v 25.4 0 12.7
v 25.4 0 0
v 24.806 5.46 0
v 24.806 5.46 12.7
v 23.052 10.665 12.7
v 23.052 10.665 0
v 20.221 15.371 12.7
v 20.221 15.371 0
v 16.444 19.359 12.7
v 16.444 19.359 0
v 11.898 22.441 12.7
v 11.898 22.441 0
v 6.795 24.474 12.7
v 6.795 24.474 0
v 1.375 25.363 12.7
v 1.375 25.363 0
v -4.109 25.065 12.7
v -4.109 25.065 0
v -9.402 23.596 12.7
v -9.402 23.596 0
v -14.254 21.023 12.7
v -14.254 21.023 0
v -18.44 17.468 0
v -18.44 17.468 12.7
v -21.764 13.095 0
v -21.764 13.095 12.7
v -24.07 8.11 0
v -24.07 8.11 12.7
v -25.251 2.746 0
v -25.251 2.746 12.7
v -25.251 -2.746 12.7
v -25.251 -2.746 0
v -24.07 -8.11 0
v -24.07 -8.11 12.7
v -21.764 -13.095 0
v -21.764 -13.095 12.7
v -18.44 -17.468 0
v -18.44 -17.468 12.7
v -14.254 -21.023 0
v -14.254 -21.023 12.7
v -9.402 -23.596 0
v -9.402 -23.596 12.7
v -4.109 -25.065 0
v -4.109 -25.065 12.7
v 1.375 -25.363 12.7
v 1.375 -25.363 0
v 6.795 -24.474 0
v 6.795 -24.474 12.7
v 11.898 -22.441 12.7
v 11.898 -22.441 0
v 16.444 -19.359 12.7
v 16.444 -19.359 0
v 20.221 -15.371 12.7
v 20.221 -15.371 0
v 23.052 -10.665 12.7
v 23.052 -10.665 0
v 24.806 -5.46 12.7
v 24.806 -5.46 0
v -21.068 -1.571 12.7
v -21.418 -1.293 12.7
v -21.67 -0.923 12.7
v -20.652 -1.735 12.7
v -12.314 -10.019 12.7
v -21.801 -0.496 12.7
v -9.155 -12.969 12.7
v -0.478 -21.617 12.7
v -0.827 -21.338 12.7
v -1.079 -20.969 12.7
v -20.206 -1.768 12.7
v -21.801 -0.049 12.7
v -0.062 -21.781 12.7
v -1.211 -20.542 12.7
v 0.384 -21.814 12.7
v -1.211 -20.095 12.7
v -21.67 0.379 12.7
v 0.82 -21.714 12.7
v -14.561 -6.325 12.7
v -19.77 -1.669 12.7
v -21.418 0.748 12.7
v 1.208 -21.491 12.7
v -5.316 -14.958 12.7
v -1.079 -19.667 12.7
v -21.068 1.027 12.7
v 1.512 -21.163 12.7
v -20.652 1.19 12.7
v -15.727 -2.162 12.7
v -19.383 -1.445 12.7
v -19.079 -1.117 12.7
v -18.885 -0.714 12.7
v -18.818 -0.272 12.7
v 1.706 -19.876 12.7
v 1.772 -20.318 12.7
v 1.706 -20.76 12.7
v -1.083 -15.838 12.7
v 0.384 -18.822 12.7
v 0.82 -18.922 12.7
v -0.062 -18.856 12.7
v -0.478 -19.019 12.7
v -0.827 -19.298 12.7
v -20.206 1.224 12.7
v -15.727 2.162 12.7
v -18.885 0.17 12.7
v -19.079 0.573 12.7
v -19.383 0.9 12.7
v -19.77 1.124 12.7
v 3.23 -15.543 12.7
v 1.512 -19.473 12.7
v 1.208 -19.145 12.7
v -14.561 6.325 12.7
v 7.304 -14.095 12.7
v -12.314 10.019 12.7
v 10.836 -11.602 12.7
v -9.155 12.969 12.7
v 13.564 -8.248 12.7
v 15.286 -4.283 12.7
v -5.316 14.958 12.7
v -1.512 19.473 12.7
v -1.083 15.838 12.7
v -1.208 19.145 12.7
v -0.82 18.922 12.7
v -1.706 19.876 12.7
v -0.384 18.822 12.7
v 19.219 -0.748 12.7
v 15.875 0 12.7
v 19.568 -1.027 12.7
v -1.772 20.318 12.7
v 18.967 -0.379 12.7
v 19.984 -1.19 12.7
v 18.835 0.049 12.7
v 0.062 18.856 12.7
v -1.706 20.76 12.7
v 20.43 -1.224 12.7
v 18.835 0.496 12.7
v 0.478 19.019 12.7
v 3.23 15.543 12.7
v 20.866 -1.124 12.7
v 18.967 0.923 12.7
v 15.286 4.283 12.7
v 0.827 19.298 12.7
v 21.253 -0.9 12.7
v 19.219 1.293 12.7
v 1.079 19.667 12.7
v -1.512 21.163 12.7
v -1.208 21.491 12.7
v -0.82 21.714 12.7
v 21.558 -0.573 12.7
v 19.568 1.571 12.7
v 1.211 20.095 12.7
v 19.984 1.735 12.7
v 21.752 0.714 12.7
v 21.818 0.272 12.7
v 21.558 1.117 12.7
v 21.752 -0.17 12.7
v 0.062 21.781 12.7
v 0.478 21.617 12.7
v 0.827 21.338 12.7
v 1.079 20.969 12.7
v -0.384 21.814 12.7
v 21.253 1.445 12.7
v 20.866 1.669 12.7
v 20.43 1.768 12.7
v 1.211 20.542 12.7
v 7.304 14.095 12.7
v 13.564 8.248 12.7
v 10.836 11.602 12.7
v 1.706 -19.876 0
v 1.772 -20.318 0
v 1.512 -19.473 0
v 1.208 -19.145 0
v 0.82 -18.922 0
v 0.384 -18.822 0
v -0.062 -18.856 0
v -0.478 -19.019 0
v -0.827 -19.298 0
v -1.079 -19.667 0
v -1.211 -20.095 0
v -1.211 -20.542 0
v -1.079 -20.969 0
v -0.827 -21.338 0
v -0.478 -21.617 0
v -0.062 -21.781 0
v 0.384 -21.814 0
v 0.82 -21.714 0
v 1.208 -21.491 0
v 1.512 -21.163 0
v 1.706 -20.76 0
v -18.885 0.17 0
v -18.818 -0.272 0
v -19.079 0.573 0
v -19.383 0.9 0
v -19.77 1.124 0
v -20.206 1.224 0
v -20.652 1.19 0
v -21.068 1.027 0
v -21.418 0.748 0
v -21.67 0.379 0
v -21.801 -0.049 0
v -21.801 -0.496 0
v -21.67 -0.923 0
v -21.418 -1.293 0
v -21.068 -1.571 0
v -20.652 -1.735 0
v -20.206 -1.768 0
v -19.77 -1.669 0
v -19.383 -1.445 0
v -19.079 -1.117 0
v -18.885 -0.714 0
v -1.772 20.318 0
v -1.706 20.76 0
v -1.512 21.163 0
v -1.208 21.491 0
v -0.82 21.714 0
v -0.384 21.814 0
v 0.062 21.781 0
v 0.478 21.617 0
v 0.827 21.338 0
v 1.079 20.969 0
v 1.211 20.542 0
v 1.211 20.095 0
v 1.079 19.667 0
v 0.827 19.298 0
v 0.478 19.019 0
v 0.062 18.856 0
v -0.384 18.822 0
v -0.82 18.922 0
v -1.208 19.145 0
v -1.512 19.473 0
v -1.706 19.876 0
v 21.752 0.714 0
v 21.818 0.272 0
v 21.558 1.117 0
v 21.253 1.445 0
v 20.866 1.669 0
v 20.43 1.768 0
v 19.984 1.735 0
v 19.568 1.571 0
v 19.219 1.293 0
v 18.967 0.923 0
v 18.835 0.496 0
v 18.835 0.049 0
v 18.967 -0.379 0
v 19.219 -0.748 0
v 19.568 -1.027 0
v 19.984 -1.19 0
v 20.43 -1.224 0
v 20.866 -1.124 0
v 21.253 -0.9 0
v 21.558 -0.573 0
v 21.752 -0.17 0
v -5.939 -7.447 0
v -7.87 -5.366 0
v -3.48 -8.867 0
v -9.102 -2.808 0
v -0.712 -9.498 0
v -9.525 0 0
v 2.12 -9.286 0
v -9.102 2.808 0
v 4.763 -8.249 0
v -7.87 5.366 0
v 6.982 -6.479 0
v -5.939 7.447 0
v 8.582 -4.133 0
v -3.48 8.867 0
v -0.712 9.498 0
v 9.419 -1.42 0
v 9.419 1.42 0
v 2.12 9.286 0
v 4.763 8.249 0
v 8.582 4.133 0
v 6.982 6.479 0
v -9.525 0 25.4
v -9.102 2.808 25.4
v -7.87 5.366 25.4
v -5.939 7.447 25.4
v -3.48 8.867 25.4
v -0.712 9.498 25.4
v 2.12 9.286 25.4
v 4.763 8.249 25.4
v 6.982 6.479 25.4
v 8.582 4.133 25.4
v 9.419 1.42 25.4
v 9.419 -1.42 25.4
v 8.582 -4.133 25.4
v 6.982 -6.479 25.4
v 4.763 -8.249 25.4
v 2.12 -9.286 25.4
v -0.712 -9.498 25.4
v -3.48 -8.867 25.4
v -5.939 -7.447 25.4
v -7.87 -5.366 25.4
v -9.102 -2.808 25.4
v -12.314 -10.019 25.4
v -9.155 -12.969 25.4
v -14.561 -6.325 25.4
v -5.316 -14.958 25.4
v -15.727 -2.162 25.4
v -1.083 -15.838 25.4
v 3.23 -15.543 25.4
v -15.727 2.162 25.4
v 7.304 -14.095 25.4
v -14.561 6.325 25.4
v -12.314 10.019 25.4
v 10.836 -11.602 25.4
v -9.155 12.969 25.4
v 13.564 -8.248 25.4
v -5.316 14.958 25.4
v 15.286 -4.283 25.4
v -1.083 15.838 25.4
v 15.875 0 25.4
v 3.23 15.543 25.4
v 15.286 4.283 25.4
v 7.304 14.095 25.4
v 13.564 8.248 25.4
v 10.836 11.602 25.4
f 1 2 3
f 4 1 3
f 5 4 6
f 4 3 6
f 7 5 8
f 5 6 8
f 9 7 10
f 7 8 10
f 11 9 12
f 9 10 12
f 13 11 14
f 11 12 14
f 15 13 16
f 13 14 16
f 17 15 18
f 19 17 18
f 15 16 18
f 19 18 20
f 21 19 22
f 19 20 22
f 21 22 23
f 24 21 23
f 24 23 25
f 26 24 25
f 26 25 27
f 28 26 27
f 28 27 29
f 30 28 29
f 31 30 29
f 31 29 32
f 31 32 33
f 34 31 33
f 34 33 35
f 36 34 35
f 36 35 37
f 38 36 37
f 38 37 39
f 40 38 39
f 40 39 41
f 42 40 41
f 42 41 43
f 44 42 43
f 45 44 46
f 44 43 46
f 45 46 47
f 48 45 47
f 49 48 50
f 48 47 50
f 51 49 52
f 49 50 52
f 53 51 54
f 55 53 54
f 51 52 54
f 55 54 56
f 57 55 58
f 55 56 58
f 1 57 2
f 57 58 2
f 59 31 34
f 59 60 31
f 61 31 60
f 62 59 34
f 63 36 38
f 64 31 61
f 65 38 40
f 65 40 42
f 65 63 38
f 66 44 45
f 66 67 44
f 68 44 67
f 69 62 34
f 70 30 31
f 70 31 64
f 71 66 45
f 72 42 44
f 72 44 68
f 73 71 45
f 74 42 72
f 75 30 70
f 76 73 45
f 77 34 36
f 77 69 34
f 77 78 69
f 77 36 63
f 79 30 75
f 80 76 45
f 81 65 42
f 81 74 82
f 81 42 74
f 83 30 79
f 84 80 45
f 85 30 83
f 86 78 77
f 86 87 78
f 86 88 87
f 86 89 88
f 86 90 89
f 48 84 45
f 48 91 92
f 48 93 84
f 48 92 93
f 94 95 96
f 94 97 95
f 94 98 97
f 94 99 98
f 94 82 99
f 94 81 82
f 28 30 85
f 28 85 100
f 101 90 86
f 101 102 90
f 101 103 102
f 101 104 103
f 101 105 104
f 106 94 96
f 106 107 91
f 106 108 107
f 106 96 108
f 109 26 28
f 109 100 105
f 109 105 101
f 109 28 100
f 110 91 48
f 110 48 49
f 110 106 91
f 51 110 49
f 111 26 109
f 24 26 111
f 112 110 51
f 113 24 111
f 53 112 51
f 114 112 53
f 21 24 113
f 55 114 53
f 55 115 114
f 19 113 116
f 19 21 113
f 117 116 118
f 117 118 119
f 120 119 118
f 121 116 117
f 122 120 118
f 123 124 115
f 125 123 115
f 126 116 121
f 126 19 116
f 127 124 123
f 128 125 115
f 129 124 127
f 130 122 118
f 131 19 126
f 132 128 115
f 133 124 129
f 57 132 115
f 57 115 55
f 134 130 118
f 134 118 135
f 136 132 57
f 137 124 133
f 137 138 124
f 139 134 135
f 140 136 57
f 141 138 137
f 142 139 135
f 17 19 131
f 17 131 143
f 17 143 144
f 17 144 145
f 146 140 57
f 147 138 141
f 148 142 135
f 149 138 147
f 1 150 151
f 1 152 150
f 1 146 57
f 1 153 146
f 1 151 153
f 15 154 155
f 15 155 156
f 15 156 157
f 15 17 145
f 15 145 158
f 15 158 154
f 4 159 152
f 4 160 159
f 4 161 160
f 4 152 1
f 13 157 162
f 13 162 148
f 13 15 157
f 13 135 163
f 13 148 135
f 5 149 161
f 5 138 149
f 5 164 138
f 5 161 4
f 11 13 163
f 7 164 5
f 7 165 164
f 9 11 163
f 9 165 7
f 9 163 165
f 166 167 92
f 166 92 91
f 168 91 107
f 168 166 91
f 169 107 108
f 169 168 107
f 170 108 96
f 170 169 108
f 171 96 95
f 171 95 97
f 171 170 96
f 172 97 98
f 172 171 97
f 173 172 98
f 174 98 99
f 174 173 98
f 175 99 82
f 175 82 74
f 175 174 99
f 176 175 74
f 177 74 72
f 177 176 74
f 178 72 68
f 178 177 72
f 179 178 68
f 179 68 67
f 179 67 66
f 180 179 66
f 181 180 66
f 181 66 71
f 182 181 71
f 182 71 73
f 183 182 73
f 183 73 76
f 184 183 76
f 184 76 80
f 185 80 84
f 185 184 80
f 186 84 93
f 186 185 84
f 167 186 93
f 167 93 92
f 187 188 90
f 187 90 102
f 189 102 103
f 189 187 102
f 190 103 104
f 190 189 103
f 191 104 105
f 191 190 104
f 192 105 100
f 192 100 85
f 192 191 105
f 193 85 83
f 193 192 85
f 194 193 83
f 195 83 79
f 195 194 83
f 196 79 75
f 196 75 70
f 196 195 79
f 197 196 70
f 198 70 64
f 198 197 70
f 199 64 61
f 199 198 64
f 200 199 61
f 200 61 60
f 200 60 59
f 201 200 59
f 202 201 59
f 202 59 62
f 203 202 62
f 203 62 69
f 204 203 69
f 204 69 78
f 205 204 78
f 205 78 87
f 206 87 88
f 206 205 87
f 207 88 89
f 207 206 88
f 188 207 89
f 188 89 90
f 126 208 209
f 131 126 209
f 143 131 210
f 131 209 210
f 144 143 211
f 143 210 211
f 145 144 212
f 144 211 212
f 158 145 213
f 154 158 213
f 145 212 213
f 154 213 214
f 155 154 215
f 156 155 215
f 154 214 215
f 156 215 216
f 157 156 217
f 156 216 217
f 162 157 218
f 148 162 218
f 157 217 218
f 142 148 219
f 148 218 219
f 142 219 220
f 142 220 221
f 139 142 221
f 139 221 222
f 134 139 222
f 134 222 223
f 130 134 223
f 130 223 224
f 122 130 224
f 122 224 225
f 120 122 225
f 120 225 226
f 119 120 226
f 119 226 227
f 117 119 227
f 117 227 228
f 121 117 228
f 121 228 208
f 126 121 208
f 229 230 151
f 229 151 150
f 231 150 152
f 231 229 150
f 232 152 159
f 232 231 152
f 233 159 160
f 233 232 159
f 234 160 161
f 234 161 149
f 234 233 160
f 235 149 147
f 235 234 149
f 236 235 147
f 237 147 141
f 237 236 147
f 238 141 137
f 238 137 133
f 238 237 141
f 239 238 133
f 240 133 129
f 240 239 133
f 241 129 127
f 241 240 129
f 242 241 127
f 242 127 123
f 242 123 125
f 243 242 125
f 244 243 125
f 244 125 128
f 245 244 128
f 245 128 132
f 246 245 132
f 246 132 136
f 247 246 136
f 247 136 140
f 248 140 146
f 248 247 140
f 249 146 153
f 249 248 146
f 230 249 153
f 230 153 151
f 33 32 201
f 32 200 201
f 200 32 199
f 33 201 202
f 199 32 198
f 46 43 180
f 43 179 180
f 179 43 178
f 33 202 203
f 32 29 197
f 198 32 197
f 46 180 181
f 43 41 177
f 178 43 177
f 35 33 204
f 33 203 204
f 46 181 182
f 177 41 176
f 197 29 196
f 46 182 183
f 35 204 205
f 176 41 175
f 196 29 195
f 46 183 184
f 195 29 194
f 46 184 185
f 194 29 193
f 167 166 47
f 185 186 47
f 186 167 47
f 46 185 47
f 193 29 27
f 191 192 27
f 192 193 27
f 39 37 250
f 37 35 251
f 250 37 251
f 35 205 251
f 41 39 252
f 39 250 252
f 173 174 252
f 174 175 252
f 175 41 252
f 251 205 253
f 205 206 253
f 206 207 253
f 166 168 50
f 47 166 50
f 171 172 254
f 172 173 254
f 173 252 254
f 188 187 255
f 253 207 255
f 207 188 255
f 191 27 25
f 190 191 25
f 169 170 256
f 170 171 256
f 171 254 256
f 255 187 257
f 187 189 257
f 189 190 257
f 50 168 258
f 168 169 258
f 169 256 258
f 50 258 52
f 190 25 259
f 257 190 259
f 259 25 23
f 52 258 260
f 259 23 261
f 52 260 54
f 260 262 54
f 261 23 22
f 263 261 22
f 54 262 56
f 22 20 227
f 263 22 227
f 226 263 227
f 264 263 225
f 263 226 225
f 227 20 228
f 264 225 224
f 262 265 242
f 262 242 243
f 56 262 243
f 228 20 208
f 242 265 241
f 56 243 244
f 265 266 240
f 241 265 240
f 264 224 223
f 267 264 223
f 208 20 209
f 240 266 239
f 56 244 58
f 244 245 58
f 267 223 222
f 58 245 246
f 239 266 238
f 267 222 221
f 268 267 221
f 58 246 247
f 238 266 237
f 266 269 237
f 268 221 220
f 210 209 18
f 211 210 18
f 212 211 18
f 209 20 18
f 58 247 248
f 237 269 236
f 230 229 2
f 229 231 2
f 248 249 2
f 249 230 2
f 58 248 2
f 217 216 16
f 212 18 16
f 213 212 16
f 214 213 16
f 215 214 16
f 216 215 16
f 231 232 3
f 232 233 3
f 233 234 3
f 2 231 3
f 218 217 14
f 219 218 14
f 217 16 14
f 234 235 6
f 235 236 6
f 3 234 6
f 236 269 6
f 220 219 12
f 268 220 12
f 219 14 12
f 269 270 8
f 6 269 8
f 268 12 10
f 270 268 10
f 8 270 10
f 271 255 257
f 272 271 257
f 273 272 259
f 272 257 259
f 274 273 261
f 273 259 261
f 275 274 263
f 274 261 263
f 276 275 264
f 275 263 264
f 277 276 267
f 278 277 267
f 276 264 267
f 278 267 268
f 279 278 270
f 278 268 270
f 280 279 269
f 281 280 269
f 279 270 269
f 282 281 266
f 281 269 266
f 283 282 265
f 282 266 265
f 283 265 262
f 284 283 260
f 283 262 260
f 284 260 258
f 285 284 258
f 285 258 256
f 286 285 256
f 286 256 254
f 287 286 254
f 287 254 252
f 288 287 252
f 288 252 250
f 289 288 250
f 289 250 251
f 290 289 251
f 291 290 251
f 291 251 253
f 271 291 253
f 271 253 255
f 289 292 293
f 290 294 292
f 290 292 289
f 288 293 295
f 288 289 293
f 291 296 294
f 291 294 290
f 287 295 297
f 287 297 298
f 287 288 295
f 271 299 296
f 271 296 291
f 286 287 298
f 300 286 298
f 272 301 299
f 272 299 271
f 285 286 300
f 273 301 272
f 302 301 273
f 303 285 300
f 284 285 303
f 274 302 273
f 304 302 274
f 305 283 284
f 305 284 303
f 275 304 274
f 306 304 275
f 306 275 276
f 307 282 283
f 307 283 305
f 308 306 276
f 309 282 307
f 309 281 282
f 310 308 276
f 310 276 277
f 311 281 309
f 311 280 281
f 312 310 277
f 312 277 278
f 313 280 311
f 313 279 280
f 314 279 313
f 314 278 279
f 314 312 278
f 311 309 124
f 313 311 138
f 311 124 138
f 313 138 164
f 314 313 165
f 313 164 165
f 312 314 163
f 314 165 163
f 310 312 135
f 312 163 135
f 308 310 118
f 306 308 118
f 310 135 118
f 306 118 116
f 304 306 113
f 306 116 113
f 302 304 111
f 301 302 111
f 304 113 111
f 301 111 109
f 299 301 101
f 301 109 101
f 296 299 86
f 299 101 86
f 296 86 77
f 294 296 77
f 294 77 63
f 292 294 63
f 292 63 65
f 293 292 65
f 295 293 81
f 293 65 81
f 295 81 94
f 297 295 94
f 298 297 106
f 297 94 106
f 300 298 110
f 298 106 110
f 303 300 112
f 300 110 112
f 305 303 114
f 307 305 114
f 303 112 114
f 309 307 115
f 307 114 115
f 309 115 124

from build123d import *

# Parameters (mm, degrees)
SKETCH1_R                  = 25.4
BOSS_EXTRUDE1_DEPTH        = 25.4
CUT_EXTRUDE1_START         = -12.7
SKETCH2_R                  = 25.4
SKETCH2_R_2                = 15.875
CUT_EXTRUDE1_DEPTH         = 12.7
F_3_4_0_7500_DOWEL_HOLE1_D = 19.05
F_3_0MM_DOWEL_HOLE1_D      = 3
CRVPATTERN1_OUTLINE_R      = 1.5
CRVPATTERN1_DEPTH          = 12.7


# Read off the part's stored shape, not the designer's step: CrvPattern1
with BuildPart() as part:
    # Sketch1 → Boss-Extrude1 (new body)
    with BuildSketch(Plane.XY):
        Circle(SKETCH1_R)
    extrude(amount=BOSS_EXTRUDE1_DEPTH)

    # Sketch2 → Cut-Extrude1 (cut)
    with BuildSketch(Plane.XY.offset(25.4).offset(CUT_EXTRUDE1_START)):
        Circle(SKETCH2_R)
        Circle(SKETCH2_R_2, mode=Mode.SUBTRACT)
    extrude(amount=CUT_EXTRUDE1_DEPTH, mode=Mode.SUBTRACT)

    # 3/4 (0.7500) Dowel Hole1 (through all)
    with Locations(Plane.XY.offset(25.4)):
        with Locations((0, 0)):
            Hole(F_3_4_0_7500_DOWEL_HOLE1_D / 2)

    # Ø3.0mm Dowel Hole1 (through all)
    with Locations(Plane(origin=(-0.272270363, 20.318175825, 12.7), x_dir=(1, 0, 0), z_dir=(0, 0, 1))):
        with Locations((0, 0)):
            Hole(F_3_0MM_DOWEL_HOLE1_D / 2)

    # CrvPattern1 outline → CrvPattern1 (cut)
    with BuildSketch(Plane.XY):
        with Locations((-20.318175825, -0.272270363)):
            Circle(CRVPATTERN1_OUTLINE_R)
        with Locations((0.272270363, -20.318175825)):
            Circle(CRVPATTERN1_OUTLINE_R)
        with Locations((20.318175825, 0.272270363)):
            Circle(CRVPATTERN1_OUTLINE_R)
    extrude(amount=CRVPATTERN1_DEPTH, mode=Mode.SUBTRACT)


solid = part.part
